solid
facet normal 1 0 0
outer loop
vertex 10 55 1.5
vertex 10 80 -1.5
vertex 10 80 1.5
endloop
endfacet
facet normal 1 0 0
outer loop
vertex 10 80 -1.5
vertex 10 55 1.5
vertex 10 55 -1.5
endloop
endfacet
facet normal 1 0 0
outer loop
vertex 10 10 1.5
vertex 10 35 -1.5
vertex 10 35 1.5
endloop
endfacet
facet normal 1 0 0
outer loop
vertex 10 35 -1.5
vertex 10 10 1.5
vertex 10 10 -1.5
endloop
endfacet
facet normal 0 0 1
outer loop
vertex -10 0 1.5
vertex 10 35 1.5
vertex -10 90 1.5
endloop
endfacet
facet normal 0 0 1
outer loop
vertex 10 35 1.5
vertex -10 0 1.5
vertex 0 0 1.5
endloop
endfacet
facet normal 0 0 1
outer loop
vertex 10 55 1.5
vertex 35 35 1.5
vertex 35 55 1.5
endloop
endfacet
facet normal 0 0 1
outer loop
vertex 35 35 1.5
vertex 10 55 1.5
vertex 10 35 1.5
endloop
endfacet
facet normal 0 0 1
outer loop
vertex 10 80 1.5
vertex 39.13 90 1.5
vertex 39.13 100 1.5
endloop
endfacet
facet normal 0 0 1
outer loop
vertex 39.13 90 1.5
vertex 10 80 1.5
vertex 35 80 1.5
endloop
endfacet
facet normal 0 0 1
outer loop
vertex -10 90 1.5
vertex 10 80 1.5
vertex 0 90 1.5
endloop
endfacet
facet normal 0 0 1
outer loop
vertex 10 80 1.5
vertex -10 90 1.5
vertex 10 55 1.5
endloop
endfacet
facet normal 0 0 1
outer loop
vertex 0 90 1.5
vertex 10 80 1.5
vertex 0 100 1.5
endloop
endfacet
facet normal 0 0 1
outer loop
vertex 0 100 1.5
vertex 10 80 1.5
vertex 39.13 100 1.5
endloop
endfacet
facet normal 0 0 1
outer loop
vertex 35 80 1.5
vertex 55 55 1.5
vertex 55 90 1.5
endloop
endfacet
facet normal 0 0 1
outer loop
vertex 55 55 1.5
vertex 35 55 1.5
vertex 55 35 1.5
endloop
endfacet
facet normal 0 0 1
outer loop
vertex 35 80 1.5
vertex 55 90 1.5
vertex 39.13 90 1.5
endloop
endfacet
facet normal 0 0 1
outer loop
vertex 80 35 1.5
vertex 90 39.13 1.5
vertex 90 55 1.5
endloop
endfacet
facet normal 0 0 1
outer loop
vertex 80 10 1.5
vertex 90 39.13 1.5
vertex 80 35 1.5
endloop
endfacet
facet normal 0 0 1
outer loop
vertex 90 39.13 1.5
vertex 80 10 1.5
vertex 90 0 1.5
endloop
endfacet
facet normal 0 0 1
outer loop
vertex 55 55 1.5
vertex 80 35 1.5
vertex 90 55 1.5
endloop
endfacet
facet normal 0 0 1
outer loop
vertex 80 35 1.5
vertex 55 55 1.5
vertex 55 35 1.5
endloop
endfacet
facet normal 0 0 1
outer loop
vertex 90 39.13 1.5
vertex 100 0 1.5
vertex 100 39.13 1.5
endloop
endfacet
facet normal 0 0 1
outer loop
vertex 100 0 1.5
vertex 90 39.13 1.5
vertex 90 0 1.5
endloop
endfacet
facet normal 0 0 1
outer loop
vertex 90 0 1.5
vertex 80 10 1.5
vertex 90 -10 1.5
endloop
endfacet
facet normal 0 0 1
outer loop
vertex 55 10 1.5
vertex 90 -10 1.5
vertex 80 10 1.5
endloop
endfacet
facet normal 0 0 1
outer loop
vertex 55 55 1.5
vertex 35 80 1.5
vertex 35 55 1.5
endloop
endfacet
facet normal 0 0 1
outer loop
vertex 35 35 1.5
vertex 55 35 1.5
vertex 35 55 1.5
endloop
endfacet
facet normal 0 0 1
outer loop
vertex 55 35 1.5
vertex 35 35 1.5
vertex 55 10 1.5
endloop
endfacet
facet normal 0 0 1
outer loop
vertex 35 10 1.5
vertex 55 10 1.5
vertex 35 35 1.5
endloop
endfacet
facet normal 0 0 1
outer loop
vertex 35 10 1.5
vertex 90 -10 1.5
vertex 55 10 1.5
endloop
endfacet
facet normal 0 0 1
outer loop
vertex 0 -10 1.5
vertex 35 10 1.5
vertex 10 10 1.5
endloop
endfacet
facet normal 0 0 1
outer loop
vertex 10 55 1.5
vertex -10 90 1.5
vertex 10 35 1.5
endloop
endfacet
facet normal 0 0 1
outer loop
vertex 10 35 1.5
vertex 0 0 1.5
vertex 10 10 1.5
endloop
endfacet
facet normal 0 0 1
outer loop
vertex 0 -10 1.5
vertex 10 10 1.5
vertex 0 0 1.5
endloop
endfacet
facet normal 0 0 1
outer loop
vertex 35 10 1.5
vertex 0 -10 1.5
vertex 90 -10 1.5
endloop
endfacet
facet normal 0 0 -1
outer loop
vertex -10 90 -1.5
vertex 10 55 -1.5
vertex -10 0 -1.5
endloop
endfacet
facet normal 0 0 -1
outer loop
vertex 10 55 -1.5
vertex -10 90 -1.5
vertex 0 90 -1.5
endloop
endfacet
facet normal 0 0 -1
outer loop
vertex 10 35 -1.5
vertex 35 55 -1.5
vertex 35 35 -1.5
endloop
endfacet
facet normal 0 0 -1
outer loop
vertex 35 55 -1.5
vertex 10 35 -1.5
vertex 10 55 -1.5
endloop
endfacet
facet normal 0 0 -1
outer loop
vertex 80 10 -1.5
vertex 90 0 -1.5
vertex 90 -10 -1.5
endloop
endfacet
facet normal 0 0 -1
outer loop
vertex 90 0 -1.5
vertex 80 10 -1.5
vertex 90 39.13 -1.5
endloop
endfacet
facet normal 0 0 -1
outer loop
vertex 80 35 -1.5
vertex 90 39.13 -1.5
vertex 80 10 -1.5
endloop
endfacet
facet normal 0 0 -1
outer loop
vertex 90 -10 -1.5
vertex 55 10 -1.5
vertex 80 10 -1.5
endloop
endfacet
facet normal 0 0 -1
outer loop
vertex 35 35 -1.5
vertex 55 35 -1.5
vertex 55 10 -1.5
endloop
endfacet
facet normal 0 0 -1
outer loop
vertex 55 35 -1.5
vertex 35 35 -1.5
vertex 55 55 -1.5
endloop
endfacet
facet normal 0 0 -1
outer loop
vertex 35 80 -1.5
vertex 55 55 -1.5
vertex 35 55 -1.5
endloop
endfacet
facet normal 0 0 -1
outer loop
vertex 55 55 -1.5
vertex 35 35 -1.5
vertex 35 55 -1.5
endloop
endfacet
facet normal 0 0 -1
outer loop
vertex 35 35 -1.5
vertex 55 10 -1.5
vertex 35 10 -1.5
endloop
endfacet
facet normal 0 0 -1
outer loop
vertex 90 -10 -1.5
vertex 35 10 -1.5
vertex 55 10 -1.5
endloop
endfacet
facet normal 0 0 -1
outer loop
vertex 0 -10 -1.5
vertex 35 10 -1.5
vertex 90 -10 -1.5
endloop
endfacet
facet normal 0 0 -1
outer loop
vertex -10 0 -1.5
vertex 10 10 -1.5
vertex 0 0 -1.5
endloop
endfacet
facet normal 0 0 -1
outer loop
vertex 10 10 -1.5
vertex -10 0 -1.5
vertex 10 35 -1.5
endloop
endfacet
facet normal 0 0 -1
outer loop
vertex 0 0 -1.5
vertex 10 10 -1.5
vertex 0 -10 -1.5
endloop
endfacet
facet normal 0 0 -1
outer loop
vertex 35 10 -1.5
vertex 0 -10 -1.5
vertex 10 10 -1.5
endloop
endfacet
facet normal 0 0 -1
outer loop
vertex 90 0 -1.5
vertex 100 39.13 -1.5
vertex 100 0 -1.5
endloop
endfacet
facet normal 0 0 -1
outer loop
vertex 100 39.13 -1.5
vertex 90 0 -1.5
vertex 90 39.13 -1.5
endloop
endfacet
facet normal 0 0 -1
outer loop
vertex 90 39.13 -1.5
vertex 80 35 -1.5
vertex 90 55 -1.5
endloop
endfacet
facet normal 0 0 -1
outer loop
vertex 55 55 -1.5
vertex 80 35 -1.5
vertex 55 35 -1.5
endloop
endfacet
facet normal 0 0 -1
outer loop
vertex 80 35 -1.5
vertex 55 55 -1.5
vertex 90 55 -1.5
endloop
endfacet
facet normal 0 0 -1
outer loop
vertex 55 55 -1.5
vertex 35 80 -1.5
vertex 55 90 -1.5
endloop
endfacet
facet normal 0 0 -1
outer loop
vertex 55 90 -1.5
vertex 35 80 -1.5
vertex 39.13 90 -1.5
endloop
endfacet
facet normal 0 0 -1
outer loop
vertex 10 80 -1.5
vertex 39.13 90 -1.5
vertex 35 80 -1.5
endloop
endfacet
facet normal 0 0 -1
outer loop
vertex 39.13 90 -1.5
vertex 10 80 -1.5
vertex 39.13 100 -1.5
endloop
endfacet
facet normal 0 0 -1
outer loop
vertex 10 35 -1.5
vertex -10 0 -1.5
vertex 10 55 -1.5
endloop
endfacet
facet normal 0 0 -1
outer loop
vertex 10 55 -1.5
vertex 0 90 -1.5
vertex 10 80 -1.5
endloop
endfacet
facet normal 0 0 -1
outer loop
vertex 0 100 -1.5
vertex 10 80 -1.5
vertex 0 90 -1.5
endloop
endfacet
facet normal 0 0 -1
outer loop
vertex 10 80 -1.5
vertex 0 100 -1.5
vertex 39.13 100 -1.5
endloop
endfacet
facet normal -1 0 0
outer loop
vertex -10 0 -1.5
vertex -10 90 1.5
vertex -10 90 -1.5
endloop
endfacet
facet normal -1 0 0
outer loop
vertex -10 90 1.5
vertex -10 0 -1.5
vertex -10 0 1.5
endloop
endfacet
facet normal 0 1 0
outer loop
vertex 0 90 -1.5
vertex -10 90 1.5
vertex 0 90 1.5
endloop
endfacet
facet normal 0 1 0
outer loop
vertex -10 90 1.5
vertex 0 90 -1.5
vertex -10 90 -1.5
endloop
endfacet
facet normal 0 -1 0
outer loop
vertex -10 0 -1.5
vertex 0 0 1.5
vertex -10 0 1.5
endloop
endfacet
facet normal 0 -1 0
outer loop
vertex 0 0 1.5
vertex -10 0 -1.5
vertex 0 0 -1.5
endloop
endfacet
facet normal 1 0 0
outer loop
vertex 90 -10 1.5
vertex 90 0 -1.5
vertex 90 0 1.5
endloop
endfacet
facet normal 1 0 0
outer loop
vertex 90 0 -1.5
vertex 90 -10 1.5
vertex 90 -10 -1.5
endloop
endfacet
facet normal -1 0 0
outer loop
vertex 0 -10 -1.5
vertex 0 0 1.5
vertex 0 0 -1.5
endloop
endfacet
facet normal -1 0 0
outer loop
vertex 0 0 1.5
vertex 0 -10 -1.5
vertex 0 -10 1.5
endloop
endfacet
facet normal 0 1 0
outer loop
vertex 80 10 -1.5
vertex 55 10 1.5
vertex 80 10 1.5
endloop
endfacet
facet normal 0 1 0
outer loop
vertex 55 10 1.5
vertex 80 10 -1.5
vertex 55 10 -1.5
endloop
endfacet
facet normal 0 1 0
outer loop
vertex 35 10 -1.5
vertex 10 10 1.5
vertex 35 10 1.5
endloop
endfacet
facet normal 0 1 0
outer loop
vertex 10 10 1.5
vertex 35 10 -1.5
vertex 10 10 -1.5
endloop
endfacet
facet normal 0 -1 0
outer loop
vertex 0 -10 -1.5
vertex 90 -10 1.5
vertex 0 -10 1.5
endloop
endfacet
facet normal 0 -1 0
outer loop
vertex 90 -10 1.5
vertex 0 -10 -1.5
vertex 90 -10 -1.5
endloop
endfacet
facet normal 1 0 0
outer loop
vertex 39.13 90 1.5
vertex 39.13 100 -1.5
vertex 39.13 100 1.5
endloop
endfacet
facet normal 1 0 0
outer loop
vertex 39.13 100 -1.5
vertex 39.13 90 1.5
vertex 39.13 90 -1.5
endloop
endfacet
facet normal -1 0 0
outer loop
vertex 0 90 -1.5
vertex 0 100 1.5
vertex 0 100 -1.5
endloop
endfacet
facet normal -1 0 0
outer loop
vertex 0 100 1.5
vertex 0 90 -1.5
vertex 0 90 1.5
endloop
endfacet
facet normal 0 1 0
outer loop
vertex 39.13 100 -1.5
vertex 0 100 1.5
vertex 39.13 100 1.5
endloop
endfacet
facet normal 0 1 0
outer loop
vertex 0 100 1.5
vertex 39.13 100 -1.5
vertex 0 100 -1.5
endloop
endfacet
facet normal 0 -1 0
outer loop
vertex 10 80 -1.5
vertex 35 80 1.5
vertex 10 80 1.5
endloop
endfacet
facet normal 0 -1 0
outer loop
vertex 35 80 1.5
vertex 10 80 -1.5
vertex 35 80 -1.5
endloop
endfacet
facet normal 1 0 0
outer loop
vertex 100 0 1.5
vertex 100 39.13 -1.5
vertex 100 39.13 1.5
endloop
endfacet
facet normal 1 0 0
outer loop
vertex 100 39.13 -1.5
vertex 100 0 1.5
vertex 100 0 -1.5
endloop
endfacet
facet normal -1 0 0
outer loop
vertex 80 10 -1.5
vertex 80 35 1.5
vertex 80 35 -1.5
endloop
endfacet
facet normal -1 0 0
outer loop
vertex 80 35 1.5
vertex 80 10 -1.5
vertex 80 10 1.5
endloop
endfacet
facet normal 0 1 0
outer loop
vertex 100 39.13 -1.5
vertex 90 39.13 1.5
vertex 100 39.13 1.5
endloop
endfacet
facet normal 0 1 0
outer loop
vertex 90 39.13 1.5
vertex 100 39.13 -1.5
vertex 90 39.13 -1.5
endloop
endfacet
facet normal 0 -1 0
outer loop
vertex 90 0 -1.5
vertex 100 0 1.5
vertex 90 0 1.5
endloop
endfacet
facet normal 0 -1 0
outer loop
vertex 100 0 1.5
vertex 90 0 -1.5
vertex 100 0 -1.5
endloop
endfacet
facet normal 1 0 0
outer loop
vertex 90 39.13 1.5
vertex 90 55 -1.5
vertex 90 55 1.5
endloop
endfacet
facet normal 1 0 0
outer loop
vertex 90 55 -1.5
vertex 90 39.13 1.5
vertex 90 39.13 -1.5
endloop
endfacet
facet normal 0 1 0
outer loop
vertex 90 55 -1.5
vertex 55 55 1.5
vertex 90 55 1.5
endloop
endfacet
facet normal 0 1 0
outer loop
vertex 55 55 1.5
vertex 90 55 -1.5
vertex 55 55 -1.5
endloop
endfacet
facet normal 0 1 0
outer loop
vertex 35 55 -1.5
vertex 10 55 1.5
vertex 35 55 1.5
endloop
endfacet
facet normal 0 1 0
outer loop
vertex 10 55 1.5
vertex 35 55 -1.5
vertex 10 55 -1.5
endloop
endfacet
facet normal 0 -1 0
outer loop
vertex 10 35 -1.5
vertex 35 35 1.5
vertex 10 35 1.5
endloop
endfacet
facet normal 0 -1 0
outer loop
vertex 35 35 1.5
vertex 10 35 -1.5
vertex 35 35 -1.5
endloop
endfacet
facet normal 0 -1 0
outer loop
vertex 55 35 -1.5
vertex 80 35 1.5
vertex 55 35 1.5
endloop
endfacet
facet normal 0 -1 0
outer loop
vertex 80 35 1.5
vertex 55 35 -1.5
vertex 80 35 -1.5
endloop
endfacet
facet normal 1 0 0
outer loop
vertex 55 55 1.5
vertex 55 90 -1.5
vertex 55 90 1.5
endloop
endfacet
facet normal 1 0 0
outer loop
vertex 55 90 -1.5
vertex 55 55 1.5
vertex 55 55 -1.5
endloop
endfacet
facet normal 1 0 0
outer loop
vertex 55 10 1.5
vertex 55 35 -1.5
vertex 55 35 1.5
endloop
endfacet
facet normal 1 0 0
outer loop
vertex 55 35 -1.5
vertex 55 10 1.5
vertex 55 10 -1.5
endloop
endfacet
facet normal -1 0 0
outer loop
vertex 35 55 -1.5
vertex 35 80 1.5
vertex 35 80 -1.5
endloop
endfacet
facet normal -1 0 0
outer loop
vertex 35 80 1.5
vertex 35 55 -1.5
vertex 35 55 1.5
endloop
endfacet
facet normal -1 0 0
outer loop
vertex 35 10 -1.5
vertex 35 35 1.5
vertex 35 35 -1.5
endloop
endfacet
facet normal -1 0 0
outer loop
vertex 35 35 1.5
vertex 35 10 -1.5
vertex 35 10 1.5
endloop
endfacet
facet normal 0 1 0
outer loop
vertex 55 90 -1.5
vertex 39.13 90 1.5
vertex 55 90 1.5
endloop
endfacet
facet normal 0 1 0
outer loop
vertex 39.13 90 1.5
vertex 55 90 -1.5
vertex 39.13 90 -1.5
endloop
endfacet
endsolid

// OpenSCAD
rim_height = 6;
body_height = 3;
led_width = 5;
outer_width = led_width * 4;
led_section = 10;
section_length = 90;
cross_length = section_length/2.3;


module quarter_pos(body_width, body_height){
    translate([0, section_length/2, 0])
    cube([body_width, section_length, body_height], center=true);
    translate([section_length/2, 0, 0])
    cube([section_length, body_width, body_height], center=true);

    // outer cross ornament
    translate([cross_length/2, section_length, 0])
    cube([cross_length, body_width, body_height], center=true);
    translate([section_length, cross_length/2, 0])
    cube([body_width, cross_length, body_height], center=true); 

    // smaller cross
    translate([section_length/2, section_length/2, 0])
    cube([section_length, body_width, body_height], center=true);
    translate([section_length/2, section_length/2, 0])
    cube([body_width, section_length, body_height], center=true); 

}

quarter_pos(outer_width, body_height);
